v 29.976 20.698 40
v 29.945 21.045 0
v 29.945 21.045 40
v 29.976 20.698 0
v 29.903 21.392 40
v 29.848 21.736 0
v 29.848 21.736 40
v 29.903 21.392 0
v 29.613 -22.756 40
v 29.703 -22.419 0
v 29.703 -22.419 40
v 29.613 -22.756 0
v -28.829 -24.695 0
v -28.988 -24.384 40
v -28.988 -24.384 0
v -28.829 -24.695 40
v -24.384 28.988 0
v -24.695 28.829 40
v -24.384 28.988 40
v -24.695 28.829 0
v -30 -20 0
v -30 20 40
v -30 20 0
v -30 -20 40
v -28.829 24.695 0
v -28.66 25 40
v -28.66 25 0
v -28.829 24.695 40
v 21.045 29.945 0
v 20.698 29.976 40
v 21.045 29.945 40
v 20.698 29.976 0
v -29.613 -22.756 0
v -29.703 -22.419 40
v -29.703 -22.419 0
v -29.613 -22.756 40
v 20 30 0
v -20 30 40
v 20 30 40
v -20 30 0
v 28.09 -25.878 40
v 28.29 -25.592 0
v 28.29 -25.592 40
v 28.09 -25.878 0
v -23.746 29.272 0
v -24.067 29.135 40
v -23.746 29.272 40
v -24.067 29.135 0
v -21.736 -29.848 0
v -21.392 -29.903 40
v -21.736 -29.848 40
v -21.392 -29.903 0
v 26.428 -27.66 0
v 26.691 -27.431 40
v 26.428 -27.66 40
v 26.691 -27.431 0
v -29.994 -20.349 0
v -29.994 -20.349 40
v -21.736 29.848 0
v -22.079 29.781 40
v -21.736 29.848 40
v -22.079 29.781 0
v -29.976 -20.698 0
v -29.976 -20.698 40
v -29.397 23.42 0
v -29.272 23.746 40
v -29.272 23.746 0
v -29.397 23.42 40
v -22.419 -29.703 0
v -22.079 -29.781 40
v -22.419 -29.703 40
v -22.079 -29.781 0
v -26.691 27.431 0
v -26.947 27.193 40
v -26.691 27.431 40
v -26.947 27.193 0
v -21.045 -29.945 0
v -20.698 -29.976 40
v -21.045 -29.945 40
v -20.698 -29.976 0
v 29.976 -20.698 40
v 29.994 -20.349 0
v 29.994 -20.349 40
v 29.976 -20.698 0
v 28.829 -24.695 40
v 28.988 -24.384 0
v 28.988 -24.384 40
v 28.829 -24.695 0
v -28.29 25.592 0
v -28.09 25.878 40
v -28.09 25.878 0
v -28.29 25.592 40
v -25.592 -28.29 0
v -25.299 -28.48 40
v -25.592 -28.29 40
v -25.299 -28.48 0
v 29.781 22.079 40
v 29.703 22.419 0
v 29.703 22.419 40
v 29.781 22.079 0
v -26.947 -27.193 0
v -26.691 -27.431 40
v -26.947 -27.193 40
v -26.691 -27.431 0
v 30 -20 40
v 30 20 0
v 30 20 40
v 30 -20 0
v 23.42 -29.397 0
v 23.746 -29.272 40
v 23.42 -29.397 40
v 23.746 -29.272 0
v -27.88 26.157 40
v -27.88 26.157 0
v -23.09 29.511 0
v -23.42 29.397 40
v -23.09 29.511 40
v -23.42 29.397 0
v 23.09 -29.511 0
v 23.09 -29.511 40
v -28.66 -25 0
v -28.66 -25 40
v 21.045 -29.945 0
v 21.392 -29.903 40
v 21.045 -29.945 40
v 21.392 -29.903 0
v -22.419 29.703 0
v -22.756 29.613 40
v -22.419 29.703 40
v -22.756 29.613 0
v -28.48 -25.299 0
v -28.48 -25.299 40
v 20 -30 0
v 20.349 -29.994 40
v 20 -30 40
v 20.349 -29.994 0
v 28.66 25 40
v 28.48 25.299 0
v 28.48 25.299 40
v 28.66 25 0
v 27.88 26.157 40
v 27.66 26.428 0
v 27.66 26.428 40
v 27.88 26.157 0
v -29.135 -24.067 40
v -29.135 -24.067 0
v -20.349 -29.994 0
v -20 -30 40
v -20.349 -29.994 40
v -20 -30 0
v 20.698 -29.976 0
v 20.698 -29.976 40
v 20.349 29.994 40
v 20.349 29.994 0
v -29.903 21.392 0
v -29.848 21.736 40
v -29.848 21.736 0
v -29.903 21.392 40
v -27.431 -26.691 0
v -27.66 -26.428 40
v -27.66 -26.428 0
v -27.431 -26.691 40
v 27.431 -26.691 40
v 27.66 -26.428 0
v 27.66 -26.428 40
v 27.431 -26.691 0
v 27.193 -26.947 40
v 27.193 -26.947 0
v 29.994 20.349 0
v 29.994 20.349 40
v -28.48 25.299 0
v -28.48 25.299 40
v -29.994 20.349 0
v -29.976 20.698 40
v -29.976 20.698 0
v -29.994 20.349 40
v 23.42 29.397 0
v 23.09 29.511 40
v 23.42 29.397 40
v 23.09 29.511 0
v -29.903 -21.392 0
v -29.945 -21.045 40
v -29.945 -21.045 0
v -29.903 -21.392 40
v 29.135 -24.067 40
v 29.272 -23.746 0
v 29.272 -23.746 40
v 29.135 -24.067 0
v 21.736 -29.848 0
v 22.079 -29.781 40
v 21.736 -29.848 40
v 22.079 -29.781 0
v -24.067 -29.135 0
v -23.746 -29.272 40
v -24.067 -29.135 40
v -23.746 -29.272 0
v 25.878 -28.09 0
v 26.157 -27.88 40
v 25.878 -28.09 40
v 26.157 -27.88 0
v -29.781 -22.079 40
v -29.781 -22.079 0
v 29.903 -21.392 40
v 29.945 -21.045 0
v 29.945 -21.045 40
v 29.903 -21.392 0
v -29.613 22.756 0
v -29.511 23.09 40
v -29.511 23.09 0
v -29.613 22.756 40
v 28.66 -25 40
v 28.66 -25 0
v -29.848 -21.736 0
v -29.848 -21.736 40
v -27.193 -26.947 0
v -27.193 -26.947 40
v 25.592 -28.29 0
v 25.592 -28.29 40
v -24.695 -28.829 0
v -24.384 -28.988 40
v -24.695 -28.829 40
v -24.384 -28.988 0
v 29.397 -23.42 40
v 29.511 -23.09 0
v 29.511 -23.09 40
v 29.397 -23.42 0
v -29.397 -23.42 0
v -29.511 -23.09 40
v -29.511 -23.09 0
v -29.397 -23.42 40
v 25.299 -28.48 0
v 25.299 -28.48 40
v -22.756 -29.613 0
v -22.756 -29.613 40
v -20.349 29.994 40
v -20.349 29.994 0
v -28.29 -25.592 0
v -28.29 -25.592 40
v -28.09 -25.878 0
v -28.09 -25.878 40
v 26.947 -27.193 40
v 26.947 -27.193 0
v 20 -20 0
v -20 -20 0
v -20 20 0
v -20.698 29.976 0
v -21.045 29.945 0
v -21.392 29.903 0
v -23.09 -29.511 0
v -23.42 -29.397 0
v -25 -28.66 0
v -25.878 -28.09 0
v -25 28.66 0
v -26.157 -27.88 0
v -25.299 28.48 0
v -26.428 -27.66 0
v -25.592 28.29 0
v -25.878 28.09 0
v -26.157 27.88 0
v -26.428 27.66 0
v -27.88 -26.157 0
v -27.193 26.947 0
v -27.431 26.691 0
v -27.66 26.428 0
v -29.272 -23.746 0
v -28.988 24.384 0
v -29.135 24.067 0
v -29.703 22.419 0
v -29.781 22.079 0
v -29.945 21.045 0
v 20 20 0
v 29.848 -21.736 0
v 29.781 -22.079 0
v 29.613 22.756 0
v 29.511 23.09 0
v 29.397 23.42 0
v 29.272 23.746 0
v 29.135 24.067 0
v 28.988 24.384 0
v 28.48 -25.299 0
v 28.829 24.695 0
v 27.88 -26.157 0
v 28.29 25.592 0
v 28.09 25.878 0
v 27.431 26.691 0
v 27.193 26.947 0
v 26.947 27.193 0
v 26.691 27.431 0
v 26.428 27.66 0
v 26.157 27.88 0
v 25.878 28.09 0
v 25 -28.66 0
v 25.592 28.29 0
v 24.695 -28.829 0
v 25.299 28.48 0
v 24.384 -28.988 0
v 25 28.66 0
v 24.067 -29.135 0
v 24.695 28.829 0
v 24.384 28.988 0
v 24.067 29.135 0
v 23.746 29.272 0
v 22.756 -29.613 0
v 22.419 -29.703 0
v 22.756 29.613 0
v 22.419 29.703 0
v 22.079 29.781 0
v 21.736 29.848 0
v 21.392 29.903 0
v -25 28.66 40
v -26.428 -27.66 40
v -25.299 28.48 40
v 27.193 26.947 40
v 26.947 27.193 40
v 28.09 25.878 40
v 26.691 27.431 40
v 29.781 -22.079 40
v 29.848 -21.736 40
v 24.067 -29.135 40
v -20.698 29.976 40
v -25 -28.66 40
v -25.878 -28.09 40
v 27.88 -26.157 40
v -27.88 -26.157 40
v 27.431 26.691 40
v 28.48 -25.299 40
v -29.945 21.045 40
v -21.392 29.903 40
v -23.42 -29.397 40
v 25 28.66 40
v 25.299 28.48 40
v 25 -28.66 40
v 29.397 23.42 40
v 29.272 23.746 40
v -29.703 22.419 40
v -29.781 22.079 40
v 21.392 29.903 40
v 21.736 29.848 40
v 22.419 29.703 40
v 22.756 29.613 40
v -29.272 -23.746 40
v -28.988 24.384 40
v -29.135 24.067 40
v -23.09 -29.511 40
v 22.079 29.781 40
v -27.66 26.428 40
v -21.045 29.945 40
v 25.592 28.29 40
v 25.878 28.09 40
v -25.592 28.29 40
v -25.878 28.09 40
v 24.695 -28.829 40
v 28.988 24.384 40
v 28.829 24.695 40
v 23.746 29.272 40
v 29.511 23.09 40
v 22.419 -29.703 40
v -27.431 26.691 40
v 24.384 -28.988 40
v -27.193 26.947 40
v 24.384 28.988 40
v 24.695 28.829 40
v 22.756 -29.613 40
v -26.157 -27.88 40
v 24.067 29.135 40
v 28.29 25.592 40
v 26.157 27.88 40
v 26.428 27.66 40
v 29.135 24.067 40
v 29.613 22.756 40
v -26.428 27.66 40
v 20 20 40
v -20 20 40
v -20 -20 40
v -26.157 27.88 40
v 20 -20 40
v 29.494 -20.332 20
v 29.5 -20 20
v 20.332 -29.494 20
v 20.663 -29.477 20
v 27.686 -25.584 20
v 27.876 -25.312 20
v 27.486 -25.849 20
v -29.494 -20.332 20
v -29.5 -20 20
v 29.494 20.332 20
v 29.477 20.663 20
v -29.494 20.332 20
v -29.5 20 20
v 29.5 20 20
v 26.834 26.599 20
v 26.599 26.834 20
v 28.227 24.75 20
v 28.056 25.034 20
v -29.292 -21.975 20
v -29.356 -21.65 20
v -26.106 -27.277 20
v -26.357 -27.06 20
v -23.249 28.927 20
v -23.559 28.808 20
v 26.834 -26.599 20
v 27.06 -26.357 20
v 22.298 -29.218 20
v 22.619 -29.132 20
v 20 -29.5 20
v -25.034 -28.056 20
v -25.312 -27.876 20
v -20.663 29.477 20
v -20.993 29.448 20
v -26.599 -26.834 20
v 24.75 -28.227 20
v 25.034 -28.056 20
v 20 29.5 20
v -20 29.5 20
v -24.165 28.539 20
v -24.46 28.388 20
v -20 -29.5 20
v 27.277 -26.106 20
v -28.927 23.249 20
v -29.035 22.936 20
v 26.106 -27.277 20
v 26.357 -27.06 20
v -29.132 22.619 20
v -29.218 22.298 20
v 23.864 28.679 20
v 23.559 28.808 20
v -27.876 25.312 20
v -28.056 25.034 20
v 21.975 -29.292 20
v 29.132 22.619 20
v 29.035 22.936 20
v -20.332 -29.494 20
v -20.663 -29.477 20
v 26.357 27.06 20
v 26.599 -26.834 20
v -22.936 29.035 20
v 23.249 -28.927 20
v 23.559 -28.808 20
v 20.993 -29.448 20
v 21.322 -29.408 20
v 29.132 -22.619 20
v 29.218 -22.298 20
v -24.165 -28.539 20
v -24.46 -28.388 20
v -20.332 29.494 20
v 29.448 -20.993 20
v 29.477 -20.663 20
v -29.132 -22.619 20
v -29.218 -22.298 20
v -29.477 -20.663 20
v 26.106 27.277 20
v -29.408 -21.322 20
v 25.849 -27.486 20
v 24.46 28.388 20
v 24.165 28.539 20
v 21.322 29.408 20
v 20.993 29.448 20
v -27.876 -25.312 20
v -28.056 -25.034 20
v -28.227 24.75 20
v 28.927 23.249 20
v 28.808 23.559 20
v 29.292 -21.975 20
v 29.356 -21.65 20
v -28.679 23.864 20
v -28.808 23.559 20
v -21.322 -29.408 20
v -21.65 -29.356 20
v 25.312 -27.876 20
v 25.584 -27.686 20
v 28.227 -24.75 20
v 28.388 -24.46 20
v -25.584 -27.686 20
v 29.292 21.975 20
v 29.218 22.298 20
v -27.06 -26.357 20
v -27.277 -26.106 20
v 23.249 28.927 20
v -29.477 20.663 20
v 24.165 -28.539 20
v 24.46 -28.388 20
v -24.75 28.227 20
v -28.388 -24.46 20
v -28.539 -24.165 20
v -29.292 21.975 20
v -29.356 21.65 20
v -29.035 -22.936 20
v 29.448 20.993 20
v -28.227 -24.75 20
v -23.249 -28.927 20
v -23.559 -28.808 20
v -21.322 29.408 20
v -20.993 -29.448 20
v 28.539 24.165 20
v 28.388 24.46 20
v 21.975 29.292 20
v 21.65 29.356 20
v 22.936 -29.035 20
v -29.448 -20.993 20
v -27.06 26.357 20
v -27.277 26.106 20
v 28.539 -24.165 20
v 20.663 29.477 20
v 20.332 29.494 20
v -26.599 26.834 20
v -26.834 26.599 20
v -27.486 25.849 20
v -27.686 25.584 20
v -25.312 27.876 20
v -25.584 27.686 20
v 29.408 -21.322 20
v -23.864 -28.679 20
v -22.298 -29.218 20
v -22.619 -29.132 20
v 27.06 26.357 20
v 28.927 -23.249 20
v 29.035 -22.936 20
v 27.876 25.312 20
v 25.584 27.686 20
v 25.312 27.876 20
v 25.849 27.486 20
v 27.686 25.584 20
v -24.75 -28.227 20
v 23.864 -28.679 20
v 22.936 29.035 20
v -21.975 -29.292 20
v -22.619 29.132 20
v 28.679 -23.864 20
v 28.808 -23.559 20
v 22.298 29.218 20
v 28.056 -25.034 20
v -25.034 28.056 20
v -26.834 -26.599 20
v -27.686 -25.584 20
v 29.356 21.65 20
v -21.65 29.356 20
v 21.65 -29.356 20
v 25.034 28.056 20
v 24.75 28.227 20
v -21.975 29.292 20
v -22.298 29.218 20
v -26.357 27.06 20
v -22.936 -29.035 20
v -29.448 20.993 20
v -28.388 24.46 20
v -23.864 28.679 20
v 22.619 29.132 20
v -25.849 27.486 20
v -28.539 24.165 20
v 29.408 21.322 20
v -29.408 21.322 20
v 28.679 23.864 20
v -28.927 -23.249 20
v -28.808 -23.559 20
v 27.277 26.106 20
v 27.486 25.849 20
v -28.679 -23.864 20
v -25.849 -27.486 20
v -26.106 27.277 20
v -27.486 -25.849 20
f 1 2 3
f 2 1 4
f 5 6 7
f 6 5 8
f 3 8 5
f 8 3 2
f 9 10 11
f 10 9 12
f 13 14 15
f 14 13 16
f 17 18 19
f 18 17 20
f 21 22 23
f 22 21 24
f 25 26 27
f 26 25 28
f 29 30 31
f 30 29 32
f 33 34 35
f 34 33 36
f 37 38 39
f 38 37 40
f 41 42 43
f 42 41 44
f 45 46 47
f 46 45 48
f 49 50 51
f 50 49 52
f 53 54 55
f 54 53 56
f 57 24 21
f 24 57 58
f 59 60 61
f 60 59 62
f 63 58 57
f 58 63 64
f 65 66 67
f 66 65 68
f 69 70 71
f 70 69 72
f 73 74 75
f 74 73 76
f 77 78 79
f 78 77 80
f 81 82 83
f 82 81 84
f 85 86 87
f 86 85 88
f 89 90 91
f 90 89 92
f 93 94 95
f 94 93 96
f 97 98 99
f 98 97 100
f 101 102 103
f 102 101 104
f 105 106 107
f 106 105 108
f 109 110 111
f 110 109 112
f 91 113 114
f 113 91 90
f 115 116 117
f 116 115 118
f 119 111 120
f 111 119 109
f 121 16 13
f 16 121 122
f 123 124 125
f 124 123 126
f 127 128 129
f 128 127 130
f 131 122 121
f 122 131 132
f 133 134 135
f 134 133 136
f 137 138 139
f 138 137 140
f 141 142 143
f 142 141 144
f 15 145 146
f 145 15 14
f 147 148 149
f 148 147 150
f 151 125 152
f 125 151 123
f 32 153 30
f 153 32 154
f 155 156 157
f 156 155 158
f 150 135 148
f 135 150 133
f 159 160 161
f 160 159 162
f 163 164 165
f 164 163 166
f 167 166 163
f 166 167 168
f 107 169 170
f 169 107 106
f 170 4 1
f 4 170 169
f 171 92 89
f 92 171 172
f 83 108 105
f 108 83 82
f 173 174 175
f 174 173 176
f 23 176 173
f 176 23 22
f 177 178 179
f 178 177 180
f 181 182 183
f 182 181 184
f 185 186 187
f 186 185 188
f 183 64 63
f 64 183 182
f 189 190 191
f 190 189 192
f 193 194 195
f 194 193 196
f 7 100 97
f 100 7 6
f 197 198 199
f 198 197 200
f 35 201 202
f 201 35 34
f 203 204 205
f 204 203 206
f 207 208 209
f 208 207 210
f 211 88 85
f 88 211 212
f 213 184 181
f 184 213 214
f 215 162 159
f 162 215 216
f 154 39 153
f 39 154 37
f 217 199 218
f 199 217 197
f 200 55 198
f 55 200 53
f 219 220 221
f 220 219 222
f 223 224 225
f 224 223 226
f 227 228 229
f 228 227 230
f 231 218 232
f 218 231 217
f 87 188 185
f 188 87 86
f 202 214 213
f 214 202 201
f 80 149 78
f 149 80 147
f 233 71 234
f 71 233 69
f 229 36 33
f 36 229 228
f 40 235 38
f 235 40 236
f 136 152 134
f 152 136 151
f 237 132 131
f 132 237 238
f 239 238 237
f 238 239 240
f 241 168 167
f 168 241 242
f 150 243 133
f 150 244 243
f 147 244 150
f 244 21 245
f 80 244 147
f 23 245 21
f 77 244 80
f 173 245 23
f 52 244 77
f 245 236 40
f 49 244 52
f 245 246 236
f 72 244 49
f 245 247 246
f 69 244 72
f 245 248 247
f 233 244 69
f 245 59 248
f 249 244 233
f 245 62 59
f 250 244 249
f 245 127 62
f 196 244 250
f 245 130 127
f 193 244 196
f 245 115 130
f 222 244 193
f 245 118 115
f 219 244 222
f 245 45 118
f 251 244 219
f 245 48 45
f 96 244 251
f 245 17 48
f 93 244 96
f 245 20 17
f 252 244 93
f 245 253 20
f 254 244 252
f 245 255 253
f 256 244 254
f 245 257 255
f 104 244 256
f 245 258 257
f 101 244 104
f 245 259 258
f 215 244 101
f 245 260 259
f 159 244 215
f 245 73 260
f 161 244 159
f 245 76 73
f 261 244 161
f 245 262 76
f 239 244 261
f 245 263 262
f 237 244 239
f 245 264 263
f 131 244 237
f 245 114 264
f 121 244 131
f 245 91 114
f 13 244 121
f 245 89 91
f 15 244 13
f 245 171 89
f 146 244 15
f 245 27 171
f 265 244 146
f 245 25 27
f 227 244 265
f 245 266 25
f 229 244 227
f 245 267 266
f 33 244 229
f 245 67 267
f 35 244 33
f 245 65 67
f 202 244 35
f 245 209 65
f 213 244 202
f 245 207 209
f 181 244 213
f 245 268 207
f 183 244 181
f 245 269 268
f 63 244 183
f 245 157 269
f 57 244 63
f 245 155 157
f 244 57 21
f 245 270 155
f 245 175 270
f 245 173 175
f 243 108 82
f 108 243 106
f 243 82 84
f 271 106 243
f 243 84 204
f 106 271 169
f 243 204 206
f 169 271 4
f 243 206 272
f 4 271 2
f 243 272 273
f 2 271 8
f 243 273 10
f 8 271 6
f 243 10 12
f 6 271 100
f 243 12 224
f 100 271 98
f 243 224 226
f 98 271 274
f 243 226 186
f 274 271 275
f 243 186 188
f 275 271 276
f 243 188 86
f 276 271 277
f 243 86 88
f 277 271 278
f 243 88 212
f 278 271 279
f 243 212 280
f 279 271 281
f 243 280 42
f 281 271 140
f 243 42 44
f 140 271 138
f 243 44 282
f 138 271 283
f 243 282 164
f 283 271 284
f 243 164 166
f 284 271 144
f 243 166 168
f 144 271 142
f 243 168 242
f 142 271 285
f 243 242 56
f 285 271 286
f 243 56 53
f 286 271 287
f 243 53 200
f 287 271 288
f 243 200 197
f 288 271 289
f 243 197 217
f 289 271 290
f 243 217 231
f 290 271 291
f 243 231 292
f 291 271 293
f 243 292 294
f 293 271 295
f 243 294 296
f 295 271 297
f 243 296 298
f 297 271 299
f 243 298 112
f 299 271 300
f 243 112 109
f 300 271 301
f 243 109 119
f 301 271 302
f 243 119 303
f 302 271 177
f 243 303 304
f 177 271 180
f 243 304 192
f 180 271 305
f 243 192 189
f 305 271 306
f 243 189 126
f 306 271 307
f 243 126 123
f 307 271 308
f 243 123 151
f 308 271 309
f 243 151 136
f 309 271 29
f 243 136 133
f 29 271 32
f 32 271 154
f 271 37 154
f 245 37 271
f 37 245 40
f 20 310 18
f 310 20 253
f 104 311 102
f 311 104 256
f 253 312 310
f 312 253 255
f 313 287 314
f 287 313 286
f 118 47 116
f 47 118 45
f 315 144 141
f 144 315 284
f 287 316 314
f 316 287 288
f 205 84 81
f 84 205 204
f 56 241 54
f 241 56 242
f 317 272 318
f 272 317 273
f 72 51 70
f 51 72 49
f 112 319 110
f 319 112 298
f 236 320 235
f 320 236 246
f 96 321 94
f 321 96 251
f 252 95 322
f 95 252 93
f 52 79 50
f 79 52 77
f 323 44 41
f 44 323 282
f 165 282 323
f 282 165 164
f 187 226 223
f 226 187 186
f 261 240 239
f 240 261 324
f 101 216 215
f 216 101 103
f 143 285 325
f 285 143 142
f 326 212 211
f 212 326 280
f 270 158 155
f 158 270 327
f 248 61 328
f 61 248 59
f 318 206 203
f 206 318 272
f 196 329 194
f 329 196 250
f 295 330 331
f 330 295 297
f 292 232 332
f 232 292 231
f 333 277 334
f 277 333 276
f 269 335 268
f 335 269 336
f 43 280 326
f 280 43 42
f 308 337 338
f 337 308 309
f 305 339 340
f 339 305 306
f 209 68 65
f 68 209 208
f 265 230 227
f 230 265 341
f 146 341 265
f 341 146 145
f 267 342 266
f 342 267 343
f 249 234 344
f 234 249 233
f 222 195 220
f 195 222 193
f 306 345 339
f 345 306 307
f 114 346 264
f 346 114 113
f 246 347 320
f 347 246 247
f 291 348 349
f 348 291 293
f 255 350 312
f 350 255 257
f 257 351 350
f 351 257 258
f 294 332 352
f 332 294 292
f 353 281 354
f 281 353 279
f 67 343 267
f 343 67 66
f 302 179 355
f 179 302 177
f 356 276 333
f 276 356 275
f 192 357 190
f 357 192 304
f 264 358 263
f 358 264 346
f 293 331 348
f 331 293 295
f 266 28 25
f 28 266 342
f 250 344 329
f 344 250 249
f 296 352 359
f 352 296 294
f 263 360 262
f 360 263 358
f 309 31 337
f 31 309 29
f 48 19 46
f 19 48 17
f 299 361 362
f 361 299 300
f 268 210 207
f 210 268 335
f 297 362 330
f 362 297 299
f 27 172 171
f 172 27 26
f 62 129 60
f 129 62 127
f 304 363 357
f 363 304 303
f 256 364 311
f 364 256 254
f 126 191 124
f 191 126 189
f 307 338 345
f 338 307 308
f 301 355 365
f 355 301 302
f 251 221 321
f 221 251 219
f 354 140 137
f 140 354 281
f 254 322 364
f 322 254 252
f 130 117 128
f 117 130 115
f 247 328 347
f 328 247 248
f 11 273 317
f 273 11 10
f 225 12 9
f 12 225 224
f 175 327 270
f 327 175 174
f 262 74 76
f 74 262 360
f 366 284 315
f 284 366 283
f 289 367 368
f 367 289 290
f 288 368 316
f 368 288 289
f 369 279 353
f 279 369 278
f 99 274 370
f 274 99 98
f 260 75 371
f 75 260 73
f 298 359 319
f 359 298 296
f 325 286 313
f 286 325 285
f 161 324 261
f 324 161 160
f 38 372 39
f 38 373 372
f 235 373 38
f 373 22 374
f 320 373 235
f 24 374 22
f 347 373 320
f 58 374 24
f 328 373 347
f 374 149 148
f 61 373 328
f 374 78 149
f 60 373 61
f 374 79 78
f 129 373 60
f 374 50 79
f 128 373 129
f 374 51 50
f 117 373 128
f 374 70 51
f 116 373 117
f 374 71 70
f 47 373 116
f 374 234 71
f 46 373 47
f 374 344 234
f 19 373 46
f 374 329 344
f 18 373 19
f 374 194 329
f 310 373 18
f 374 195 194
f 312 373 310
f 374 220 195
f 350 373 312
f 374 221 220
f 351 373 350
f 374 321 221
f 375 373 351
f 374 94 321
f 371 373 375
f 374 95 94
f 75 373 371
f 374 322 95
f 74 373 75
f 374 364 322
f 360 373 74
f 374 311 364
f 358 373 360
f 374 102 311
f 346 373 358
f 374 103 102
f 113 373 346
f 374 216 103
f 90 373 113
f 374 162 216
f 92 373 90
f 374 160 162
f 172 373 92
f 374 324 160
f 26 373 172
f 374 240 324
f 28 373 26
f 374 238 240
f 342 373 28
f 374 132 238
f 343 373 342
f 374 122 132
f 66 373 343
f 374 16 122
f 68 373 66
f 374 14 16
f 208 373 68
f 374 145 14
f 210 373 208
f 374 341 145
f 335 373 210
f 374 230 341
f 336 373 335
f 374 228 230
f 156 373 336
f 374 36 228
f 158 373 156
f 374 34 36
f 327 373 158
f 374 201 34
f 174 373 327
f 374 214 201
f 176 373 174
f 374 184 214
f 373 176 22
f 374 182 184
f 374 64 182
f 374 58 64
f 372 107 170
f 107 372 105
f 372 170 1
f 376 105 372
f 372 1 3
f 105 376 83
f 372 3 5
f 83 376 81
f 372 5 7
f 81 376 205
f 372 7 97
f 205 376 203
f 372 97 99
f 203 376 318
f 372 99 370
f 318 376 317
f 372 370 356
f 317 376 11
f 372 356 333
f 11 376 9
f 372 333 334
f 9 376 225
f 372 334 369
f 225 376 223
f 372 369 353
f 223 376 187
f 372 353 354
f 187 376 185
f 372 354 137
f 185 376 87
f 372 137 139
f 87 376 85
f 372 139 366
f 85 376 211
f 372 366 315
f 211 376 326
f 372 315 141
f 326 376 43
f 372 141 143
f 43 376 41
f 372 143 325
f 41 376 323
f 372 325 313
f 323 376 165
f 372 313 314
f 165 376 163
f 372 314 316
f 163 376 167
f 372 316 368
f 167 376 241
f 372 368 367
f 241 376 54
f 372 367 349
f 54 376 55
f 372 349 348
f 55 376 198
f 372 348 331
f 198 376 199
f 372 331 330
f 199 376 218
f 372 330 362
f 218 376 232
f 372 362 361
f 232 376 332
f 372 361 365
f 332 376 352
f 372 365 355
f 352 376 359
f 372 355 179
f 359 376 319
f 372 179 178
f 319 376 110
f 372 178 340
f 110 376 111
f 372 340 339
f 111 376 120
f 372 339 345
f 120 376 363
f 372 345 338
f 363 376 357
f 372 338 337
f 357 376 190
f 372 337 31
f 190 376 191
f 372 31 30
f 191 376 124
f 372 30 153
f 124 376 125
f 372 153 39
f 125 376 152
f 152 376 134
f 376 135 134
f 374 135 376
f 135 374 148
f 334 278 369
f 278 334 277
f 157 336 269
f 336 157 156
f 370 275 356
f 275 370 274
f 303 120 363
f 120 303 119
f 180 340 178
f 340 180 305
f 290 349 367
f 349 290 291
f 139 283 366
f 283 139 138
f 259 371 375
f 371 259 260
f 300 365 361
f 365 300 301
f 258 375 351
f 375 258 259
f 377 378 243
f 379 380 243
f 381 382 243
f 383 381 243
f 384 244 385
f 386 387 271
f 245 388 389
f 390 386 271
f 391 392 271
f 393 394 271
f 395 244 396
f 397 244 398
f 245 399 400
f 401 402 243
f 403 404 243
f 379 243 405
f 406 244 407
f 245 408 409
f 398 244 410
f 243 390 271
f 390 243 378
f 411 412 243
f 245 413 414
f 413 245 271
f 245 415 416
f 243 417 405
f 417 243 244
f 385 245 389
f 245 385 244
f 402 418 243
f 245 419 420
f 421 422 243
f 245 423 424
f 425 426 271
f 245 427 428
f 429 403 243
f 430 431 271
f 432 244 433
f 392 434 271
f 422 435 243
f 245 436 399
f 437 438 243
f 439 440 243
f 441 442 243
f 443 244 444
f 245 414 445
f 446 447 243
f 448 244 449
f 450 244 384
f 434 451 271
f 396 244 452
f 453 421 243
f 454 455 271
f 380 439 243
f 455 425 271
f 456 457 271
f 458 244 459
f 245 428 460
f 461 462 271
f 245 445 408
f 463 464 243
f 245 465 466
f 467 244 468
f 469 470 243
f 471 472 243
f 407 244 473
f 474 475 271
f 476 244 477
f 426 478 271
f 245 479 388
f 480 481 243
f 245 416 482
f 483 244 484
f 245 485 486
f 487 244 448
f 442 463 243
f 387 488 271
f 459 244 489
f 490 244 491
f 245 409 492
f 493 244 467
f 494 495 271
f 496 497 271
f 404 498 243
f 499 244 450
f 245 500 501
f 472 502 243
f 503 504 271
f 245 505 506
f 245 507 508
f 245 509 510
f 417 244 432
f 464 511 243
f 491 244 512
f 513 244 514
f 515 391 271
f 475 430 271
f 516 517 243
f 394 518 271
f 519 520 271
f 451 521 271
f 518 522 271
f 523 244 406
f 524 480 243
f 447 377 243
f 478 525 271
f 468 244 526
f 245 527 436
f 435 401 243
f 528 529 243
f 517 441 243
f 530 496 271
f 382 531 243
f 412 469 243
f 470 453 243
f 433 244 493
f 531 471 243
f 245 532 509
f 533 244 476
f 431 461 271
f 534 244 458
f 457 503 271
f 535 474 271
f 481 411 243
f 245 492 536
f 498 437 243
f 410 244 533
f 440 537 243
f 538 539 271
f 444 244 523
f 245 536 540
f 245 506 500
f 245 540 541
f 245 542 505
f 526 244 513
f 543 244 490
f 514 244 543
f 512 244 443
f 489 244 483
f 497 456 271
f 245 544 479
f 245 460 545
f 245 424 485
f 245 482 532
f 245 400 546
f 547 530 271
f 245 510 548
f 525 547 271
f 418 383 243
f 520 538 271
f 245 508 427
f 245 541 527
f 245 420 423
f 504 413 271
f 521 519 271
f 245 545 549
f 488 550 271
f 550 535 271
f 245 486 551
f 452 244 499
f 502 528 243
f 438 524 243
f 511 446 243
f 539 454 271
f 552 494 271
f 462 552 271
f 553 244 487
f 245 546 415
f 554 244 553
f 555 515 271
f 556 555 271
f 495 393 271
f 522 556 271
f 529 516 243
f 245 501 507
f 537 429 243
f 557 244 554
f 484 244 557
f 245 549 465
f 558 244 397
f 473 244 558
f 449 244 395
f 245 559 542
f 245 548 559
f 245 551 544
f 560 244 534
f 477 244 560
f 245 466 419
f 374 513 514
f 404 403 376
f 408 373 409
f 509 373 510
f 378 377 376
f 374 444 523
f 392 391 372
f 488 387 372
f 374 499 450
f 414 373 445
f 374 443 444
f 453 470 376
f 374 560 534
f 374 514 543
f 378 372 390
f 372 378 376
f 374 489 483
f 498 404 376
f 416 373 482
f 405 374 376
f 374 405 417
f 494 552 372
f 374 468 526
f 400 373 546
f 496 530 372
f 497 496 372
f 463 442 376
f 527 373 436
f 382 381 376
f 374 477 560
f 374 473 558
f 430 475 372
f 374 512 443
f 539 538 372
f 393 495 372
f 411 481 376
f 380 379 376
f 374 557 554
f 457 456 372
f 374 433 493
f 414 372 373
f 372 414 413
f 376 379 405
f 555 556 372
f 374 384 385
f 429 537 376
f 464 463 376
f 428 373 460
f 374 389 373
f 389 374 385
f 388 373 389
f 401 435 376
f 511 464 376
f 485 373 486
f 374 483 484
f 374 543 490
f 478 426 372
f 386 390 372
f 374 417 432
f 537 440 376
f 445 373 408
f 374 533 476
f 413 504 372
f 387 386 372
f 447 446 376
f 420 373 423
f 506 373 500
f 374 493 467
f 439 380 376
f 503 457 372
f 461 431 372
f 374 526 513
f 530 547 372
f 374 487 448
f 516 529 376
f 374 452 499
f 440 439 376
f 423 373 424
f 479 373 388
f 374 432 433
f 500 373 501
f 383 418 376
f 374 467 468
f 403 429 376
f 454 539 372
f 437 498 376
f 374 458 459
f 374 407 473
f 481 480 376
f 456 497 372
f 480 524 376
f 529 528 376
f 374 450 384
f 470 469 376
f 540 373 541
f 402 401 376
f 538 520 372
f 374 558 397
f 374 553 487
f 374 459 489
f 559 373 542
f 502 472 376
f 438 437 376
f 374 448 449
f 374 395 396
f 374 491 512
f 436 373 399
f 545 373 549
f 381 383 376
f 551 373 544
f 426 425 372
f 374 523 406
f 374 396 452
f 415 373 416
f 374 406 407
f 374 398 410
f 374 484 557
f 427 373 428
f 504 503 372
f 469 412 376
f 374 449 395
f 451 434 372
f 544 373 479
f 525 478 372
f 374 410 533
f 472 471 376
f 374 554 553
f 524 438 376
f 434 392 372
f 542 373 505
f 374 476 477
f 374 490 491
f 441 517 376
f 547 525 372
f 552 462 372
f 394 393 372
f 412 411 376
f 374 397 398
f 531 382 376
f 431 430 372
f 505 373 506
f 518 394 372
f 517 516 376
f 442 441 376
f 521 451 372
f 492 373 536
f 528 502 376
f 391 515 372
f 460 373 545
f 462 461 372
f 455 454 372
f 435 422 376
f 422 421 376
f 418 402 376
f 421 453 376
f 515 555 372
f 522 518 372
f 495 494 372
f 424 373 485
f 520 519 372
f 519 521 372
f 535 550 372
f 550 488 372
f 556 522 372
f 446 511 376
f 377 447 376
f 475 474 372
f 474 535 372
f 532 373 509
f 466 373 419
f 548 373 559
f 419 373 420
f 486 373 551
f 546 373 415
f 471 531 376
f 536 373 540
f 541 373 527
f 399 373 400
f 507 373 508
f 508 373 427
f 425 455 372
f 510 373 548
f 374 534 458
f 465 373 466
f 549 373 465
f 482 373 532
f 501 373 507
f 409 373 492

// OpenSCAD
$fn = 180;
thinnest_width = 0.5;

difference() {
	linear_extrude(40) {
		minkowski() {
			square(40, center=true);
			circle(r=10);
		}
	}
	minkowski() {
		scale([1, 1, 0]) {
			cube(40, center=true);
		}
		cylinder(h=20, r1=0, r2=10 - thinnest_width);
	}
	translate([0, 0, 20]) {
		minkowski() {
			scale([1, 1, 0]) {
				cube(40, center=true);
			}
			cylinder(h=20, r1=10 - thinnest_width, r2=0);
		}
	}
}
